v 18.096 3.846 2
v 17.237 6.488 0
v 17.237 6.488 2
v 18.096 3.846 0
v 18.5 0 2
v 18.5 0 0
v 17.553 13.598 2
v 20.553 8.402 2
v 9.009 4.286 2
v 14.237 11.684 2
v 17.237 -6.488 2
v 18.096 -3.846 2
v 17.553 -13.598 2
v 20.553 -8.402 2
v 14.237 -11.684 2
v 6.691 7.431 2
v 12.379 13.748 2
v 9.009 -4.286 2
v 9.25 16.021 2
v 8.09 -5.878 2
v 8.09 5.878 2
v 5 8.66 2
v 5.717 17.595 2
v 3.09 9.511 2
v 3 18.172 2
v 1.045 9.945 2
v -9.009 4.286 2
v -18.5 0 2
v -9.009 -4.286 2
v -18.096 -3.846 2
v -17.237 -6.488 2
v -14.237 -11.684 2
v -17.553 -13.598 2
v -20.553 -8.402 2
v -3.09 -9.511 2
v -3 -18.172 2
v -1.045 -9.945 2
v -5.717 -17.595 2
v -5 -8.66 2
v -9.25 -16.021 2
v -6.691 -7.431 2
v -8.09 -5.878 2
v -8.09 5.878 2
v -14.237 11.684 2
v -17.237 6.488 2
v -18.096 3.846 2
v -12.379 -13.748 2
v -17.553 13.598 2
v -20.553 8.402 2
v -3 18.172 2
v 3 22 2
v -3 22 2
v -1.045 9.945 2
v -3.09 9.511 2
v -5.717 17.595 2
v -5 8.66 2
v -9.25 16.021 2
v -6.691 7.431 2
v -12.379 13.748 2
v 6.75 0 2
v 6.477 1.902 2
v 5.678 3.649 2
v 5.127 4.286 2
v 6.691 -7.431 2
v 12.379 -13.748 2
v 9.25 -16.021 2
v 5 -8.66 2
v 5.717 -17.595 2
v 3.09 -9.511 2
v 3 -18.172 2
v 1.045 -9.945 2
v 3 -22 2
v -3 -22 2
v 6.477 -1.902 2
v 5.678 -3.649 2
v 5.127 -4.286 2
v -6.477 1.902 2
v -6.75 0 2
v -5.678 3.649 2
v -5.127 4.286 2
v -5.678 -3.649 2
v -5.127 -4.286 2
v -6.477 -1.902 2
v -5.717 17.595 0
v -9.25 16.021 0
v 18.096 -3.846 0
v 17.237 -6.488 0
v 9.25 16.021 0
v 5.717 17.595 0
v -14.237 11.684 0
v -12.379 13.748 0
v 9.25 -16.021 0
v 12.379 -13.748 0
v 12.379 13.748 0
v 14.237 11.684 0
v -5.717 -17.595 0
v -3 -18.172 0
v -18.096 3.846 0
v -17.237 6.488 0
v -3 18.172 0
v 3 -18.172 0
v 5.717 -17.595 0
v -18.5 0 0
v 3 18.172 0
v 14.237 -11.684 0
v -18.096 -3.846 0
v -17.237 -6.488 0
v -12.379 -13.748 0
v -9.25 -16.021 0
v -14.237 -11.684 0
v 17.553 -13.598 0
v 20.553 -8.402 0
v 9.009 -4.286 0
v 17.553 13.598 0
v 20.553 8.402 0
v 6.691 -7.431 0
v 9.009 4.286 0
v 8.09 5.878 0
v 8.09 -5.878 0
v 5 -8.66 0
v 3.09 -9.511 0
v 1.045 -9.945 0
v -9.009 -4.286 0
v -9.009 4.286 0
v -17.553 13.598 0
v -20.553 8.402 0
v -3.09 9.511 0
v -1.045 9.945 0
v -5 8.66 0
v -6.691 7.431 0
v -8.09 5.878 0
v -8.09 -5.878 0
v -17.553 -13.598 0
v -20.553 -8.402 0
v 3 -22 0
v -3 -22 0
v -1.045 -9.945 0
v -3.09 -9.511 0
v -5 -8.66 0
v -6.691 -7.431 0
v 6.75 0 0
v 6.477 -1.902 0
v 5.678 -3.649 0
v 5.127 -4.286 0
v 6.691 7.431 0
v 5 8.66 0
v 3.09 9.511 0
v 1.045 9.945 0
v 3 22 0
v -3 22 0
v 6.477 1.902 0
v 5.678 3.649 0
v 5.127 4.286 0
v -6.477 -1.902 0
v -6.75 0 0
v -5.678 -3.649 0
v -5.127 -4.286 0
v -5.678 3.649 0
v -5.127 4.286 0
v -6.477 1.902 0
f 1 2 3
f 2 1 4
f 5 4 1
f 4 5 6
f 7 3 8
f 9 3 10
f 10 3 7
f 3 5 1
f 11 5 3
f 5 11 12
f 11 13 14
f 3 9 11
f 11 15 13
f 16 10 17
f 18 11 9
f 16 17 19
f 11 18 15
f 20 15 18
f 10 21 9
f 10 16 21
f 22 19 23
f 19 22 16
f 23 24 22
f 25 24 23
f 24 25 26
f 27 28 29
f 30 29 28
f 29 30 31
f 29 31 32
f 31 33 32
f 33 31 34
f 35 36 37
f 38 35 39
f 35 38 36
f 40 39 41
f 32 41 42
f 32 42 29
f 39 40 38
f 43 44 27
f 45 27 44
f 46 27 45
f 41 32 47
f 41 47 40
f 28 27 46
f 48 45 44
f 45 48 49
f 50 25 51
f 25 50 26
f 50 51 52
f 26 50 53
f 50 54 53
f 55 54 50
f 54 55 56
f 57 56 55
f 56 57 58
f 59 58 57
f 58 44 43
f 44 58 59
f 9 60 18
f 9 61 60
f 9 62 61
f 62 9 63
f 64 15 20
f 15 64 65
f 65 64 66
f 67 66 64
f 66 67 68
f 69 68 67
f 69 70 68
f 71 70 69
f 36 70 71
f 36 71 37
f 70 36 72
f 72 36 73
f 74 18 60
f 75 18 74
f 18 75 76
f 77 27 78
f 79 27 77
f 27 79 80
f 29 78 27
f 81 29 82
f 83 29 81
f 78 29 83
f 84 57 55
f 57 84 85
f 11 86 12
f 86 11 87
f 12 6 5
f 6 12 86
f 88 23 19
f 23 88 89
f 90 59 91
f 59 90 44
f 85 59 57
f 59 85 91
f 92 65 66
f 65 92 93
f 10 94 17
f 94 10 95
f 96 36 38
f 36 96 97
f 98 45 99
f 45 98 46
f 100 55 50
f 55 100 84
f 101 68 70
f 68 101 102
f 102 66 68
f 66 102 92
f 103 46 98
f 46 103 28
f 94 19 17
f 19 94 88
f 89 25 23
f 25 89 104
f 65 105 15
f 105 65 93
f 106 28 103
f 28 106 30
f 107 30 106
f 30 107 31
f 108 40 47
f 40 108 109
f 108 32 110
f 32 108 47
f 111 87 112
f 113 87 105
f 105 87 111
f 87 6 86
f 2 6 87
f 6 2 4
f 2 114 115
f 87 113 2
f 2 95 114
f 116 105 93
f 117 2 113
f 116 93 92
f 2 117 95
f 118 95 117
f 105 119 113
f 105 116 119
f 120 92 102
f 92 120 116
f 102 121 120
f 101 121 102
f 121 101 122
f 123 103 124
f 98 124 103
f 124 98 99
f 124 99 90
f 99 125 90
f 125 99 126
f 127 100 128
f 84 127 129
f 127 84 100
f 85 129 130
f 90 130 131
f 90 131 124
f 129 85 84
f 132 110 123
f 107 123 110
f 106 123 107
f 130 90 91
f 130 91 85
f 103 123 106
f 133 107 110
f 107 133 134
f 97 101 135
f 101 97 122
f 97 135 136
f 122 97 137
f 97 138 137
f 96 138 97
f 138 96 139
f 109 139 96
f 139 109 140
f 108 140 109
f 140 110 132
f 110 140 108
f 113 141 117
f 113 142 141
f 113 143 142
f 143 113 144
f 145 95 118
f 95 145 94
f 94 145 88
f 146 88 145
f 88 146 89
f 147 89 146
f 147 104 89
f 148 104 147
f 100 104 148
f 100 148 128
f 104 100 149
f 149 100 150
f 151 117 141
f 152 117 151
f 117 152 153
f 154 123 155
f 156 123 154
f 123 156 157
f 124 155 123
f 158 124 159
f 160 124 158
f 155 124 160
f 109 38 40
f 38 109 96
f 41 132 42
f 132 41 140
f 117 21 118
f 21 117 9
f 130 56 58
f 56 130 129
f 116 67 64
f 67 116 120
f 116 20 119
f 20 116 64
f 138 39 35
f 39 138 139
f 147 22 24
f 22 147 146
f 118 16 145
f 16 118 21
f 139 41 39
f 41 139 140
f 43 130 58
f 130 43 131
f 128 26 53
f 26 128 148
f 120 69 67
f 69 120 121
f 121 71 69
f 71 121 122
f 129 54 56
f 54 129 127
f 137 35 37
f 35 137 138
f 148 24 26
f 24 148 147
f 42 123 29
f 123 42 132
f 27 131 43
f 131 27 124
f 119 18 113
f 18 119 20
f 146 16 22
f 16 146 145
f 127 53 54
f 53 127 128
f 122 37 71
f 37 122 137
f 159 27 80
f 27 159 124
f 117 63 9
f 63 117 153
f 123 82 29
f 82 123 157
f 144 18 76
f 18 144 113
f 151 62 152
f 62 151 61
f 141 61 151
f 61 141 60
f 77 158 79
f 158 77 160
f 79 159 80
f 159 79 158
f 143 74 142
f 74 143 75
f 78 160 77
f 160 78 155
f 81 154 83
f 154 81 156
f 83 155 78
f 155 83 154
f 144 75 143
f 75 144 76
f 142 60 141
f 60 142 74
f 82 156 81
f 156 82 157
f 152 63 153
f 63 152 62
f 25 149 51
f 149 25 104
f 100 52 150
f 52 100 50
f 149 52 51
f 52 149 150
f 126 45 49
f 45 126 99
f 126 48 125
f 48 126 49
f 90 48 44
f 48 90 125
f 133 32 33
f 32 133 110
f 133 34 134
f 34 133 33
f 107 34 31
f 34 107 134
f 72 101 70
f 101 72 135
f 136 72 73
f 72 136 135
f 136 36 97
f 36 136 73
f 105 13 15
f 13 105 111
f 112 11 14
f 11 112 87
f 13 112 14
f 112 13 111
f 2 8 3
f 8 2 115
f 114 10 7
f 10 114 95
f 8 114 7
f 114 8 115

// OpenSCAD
// file: attack-ring-base.scad
thickness = 2;
base_diameter = 35;
core_diameter = 15;

module attack_ring_base() {
    clip_length = base_diameter;
    clip_width = core_diameter / 1.75;

    difference() {
        cylinder(thickness, d = base_diameter + thickness);
        cylinder(thickness, d = core_diameter + 5);
    }
    difference() {
        translate([-clip_length / 2, -clip_width / 2])
        cube([clip_length, clip_width, thickness]);
        cylinder(thickness, d = core_diameter - thickness + 0.5);
    }
}

attack_ring_base();
// main file
use <attack-ring-base.scad>

attack_ring_base();
for (i = [0:5]) {
    rotate(i * 60)
    translate([-3, 18])
    cube([6, 4, 2]);
}
